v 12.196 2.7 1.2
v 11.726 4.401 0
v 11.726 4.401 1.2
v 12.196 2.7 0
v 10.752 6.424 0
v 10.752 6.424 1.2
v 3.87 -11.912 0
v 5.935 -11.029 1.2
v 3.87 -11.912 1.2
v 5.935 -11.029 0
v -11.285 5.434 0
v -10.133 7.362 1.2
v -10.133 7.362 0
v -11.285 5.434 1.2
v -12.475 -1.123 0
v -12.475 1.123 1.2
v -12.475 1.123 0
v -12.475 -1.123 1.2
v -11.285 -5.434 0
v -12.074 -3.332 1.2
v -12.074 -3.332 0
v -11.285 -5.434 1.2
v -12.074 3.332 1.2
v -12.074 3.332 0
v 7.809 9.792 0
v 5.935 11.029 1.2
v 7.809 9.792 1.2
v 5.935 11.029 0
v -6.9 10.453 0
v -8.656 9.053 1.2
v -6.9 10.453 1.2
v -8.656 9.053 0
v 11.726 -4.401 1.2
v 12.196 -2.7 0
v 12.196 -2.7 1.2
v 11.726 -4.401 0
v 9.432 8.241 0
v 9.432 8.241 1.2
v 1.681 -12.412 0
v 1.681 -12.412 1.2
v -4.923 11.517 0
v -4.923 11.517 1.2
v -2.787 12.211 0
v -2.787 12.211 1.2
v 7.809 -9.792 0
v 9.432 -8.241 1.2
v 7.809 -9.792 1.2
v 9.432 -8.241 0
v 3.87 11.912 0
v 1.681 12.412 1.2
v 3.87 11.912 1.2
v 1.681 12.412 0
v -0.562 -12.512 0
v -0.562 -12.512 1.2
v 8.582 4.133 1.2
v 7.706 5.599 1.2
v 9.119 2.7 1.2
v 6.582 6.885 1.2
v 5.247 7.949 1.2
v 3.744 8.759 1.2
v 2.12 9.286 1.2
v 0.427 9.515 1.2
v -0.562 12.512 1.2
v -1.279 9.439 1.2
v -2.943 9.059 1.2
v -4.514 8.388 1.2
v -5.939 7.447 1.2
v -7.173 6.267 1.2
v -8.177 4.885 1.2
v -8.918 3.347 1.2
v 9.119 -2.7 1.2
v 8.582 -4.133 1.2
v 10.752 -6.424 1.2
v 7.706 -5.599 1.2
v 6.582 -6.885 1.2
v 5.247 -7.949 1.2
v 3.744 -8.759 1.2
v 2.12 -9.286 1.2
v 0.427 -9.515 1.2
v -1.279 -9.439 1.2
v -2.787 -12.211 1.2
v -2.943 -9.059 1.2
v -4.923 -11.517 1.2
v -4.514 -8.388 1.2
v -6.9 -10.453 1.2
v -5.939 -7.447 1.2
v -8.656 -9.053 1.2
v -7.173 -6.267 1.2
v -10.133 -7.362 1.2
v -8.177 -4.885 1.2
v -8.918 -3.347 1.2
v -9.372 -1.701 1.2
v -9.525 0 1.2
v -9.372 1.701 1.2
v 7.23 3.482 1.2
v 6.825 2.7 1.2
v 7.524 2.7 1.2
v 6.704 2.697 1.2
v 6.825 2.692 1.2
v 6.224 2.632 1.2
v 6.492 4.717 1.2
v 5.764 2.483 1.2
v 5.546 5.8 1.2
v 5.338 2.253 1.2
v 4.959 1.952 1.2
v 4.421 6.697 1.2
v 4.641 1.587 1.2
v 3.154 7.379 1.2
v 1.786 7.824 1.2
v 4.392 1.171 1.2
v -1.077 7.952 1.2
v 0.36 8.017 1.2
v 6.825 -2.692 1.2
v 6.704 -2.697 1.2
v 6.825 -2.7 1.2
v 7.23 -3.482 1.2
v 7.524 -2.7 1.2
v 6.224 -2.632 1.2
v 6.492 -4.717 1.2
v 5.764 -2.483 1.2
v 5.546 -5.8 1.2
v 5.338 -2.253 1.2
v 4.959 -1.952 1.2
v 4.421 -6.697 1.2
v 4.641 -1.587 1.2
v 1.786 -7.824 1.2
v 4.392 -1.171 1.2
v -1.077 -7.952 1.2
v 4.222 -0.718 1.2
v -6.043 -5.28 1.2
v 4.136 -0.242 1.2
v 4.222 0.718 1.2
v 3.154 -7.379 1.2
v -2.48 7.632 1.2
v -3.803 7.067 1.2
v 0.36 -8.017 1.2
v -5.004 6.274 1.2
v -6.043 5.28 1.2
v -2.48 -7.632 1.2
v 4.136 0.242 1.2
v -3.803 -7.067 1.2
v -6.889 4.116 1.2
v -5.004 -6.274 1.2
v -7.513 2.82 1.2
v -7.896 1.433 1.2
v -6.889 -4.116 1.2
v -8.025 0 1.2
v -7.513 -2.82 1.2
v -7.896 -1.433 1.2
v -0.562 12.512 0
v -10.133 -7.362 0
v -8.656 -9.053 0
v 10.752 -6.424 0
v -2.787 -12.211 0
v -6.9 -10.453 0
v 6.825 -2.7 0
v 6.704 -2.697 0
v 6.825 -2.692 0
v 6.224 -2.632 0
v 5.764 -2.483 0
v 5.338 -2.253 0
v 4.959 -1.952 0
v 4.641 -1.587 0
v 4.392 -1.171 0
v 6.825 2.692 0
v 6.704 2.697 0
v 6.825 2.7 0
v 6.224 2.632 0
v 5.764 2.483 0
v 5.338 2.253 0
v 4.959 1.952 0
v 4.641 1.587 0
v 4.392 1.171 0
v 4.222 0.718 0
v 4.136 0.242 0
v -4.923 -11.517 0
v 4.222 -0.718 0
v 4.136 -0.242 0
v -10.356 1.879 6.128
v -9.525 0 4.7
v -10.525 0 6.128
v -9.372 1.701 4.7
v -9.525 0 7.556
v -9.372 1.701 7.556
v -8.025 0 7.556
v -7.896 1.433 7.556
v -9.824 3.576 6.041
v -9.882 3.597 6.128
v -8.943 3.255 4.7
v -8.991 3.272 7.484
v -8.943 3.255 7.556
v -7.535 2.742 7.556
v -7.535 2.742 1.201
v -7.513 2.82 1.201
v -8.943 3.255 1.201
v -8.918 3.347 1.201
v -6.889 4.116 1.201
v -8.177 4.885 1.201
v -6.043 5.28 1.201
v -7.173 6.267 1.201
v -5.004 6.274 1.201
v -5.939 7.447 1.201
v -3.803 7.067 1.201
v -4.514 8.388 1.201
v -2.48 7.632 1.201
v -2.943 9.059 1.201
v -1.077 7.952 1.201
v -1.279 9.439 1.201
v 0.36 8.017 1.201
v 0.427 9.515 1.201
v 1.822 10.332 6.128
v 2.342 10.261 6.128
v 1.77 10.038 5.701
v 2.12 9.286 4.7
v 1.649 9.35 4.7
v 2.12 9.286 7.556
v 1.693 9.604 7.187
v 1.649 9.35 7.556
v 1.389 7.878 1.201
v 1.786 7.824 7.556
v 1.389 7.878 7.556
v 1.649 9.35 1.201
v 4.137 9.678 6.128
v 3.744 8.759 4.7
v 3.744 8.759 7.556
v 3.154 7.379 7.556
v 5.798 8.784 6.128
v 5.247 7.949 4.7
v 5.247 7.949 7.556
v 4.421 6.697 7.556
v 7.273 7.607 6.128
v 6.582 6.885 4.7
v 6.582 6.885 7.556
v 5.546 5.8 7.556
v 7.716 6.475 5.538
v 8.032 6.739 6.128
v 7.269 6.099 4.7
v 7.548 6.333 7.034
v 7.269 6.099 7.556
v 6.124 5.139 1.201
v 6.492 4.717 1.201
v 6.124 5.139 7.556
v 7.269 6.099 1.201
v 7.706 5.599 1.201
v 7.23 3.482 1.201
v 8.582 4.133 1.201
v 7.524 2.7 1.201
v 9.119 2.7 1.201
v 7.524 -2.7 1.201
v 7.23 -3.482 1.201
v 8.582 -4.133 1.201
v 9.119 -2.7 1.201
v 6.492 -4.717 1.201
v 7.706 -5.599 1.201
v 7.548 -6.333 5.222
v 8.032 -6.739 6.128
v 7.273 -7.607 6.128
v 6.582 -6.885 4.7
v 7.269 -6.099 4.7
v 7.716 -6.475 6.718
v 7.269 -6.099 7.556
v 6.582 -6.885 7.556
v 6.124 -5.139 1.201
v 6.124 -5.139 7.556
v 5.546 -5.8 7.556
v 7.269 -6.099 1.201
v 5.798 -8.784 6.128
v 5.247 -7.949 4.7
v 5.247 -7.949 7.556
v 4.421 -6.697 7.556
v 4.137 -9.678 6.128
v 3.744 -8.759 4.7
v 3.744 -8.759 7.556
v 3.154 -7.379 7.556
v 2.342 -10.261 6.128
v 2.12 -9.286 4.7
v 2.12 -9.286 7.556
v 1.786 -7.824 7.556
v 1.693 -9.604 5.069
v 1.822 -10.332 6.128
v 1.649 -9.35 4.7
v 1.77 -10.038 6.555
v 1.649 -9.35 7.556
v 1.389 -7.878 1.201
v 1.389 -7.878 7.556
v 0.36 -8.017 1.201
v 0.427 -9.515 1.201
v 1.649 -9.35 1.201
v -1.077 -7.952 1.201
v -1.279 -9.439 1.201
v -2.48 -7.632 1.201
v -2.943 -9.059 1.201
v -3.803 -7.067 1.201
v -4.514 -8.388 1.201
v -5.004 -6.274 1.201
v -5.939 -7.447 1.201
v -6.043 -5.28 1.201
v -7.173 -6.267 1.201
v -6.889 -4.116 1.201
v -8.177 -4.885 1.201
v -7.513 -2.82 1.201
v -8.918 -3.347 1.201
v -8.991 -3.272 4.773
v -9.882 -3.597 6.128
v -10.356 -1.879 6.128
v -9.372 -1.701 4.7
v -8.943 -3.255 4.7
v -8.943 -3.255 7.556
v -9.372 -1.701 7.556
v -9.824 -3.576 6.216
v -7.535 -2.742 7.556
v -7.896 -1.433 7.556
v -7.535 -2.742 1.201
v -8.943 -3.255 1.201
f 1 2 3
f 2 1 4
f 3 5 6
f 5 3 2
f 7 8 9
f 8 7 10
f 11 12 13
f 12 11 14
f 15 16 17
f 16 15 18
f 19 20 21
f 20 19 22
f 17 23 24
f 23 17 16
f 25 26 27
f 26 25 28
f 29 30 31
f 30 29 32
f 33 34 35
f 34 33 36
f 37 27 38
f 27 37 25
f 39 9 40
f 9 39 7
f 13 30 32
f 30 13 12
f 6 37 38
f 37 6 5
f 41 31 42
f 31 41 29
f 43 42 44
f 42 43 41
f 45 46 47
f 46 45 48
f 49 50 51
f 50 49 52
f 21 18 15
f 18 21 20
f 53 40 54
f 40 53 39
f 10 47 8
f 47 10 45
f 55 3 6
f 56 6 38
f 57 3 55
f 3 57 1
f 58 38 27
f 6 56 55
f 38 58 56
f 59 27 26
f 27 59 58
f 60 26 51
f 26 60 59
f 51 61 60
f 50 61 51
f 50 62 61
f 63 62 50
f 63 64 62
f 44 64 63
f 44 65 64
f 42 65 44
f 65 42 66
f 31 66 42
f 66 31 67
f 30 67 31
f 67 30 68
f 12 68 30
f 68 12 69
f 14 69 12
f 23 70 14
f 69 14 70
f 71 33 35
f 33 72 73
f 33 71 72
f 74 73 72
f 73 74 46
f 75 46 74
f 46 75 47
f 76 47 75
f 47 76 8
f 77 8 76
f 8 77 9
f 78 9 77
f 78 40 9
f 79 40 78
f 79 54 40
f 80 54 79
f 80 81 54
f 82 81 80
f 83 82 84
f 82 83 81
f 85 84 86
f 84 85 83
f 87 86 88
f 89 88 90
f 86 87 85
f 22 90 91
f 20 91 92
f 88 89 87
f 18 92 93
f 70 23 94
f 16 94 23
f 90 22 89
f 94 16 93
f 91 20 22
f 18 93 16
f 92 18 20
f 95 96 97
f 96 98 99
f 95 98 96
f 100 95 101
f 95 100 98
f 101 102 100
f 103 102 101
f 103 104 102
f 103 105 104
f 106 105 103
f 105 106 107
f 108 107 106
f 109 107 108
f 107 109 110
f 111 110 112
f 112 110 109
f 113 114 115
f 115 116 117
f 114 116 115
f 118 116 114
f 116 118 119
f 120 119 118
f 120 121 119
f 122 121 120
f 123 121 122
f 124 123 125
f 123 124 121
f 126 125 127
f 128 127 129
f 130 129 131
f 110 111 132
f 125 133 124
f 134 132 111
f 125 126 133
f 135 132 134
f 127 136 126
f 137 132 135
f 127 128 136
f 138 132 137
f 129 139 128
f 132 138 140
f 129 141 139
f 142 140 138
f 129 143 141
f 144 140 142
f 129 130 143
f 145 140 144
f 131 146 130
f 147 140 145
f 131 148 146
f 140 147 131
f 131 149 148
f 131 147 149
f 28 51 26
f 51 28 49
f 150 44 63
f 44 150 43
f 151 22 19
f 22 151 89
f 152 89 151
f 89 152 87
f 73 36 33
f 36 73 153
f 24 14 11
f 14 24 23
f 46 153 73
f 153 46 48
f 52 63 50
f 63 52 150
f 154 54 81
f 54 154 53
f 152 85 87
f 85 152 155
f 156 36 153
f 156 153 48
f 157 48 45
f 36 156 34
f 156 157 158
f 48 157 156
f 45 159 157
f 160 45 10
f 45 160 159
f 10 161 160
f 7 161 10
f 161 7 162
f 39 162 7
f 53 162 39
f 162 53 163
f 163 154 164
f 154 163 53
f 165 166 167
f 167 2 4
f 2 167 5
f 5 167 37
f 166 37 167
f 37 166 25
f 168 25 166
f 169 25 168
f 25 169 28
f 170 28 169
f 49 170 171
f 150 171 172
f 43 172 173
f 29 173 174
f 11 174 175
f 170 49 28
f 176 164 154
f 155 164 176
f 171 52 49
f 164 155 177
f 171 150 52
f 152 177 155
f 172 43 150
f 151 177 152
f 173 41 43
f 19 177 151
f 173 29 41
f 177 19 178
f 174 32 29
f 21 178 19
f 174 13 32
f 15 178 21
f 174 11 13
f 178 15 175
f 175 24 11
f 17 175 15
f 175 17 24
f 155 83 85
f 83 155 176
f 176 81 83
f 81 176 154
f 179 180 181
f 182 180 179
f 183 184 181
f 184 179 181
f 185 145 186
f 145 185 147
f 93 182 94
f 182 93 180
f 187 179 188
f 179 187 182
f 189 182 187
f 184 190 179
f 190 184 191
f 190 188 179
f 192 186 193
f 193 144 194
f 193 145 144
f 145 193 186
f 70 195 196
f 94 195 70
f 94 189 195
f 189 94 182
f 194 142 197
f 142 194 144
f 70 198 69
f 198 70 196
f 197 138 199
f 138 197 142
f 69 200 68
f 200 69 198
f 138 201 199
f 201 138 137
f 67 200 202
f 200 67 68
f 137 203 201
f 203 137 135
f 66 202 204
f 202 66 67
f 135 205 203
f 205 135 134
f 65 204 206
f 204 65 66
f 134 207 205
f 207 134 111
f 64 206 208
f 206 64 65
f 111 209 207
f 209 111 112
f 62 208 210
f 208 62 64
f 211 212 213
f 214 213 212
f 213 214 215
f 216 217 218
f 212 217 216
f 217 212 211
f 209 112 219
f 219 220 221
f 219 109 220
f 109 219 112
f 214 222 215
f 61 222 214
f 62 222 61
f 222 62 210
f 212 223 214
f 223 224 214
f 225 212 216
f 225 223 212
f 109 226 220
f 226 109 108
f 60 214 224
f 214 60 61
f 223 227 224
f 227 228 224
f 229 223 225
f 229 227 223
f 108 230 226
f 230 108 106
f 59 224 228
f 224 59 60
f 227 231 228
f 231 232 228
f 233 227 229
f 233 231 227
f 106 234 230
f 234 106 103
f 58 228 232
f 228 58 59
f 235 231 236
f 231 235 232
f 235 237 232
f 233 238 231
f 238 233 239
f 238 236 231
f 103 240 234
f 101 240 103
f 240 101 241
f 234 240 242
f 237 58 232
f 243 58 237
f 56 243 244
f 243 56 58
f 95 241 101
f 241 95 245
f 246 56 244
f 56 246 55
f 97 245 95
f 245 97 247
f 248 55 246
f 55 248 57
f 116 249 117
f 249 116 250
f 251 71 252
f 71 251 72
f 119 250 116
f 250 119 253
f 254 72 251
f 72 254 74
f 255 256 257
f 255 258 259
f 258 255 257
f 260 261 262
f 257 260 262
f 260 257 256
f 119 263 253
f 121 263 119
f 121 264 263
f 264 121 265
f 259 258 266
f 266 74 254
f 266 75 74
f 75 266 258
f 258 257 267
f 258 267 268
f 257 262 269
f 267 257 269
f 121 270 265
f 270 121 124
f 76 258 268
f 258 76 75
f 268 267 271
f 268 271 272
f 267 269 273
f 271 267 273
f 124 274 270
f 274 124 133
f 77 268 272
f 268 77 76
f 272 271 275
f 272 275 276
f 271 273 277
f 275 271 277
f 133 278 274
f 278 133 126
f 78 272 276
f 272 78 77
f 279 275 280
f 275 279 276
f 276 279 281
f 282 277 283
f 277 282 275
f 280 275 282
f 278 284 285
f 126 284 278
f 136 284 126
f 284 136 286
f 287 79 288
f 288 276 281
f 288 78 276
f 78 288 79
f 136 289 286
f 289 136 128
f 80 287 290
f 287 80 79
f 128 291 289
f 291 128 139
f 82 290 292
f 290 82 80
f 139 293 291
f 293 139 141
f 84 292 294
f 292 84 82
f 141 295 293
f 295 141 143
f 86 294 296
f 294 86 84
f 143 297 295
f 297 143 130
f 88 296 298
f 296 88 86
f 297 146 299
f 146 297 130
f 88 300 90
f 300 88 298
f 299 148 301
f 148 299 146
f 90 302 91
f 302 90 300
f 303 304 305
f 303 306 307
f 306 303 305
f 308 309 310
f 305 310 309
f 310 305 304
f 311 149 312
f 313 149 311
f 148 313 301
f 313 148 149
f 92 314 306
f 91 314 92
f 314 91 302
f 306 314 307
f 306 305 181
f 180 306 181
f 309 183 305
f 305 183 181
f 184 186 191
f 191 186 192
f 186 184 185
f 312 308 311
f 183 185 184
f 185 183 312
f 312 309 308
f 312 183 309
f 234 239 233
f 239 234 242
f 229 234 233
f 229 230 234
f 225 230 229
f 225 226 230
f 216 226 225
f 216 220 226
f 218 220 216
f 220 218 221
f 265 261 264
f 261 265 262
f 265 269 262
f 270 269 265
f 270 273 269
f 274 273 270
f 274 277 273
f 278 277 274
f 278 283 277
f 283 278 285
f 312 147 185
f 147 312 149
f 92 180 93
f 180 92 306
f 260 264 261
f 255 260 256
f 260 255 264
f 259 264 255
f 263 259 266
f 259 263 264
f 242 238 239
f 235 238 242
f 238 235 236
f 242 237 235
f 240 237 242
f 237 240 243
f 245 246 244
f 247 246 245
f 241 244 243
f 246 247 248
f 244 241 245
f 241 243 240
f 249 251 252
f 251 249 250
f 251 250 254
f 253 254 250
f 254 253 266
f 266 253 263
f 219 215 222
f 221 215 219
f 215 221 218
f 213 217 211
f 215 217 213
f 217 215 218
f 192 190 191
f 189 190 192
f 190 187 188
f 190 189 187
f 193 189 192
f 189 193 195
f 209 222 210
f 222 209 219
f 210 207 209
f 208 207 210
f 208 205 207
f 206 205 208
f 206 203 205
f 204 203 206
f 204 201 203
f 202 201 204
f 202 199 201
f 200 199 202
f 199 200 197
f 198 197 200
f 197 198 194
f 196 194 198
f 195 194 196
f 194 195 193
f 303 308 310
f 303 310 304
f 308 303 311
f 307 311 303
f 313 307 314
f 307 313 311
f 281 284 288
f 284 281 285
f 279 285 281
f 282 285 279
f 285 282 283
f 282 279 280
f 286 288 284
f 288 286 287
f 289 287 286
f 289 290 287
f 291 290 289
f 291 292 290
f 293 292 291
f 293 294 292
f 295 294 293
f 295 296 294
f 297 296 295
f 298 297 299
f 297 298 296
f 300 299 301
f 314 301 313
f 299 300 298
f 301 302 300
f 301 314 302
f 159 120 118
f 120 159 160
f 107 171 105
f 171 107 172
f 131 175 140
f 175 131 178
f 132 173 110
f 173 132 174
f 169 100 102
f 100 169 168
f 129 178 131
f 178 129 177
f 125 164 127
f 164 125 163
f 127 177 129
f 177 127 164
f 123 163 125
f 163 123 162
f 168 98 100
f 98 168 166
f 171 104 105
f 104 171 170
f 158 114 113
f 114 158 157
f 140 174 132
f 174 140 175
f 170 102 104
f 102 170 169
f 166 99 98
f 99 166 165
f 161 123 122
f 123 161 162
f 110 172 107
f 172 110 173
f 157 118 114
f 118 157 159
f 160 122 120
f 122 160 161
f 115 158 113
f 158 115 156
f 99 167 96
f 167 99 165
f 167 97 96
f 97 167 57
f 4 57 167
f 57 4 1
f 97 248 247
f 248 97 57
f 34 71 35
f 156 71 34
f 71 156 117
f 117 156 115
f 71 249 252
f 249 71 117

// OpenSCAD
// [FL_INDEX: keywords="openscad, 3d_parametric, Cable_Plug_Hole_Cover___Grommet___Bushing__Parametric, csg_solid" | COT="Parametric OpenSCAD design from 3DCodeverse"]
// Title: Cable Plug Hole Cover / Grommet / Bushing (Parametric)

/*
 * Cable Plug (Parametric), v0.42
 *
 * by Alex Franke (CodeCreations), Dec 2012
 * http://www.theFrankes.com
 * 
 * Licenced under Creative Commons Attribution - Non-Commercial - Share Alike 3.0 
 * 
 * DESCRIPTION: Covers a larger hole in an enclosure while still providing space for a 
 *   cable to fit. This is useful when you need to drill a larger hole in order to fit 
 *   the cable ends through the enclosure wall but want to limit the overall size of the 
 *   opening.  
 * 
 * INSTRUCTIONS:  Choose some values in the "User-defined values" section, render,
 *   and print. Change the numberOfCatches and sliceAngle together to control the size 
 *   of the catches. See the comments for more details. 
 * 
 * v0.42, Dec 20, 2012: Initial Release.
 * 
 * TODO: 
 *   * None at this time. 
 */

/////////////////////////////////////////////////////////////////////////////
// User-defined values... 
/////////////////////////////////////////////////////////////////////////////

caseHoleDiameter    = 19.05;     // Diameter of the hole to plug
cableHoleDiameter   = 5.4;       // Diameter of the cable(s) taht go through the plug

caseThickness       = 3.5;       // Thickness of the material being plugged
caseOverlap         = 3;         // Distance the plug will overlap the hole opening

thickness           = 1.2;       // Thickness of the flat round portion of the plug

catchPostThickness  = 1.5;       // Thickness of the plug posts that go through the hole
catchHeight         = 1;         // Height of the "catch" portion that holds the plug in place
catchAngle          = 55;        // Angle of the "catch" material that holes the plug in place 

numberOfCatches     = 3;         // Number of catches/posts
sliceAngle          = 80;        // The angle of the empty space between catches/posts

$fn                 = 35;        // General curve quality


/////////////////////////////////////////////////////////////////////////////
// The code...
/////////////////////////////////////////////////////////////////////////////

catchYOffset = catchHeight/tan(90-catchAngle); 
stemHeight = caseThickness+catchYOffset*2;

difference() {
	union () {
		cylinder(h=thickness, r=caseHoleDiameter/2+caseOverlap);
	
		translate([0,0,thickness]) 
		rotate_extrude(convexity=5) 
		translate([caseHoleDiameter/2,0,0]) 
		polygon( points=[	
			[-catchPostThickness,0],
			[-catchPostThickness,stemHeight],
			[0,stemHeight],
			[catchHeight,stemHeight-catchYOffset],
			[0,caseThickness],
			[0,0]
			] ); 
	}

	// Cable hole 
	translate([(caseHoleDiameter-cableHoleDiameter)/2,0,-0.5]) 
		cylinder(h=thickness+stemHeight+1, r=cableHoleDiameter/2);

	// Cable channel
	translate([(caseHoleDiameter-cableHoleDiameter)/2,-cableHoleDiameter/2,-0.5]) 
		cube([cableHoleDiameter/2+caseOverlap+1,cableHoleDiameter,thickness+stemHeight+1]);

	// Cut catch posts 
	translate([0,0,thickness+0.001]) 
	for( i=[0:numberOfCatches-1] )
		rotate([0,0,i*(360/numberOfCatches)]) 
			wedge(caseHoleDiameter/2+catchHeight+1,stemHeight+1, sliceAngle);
	
}

module wedge(length, height, angle) {

	x = length; 
	y = 2*x*tan(angle/2); 
	z = height;
	x2 = (y/2)/sin(angle/2);

	difference() {
		translate([0,-y/2,0]) 
			cube([x,y,z]);

		for(i=[-1,1])
			rotate([0,0,angle/2*i]) 
				translate([0,-y/2 +y/2*i,-0.5]) 
					cube([x2,y,z+1]);

	}
}
